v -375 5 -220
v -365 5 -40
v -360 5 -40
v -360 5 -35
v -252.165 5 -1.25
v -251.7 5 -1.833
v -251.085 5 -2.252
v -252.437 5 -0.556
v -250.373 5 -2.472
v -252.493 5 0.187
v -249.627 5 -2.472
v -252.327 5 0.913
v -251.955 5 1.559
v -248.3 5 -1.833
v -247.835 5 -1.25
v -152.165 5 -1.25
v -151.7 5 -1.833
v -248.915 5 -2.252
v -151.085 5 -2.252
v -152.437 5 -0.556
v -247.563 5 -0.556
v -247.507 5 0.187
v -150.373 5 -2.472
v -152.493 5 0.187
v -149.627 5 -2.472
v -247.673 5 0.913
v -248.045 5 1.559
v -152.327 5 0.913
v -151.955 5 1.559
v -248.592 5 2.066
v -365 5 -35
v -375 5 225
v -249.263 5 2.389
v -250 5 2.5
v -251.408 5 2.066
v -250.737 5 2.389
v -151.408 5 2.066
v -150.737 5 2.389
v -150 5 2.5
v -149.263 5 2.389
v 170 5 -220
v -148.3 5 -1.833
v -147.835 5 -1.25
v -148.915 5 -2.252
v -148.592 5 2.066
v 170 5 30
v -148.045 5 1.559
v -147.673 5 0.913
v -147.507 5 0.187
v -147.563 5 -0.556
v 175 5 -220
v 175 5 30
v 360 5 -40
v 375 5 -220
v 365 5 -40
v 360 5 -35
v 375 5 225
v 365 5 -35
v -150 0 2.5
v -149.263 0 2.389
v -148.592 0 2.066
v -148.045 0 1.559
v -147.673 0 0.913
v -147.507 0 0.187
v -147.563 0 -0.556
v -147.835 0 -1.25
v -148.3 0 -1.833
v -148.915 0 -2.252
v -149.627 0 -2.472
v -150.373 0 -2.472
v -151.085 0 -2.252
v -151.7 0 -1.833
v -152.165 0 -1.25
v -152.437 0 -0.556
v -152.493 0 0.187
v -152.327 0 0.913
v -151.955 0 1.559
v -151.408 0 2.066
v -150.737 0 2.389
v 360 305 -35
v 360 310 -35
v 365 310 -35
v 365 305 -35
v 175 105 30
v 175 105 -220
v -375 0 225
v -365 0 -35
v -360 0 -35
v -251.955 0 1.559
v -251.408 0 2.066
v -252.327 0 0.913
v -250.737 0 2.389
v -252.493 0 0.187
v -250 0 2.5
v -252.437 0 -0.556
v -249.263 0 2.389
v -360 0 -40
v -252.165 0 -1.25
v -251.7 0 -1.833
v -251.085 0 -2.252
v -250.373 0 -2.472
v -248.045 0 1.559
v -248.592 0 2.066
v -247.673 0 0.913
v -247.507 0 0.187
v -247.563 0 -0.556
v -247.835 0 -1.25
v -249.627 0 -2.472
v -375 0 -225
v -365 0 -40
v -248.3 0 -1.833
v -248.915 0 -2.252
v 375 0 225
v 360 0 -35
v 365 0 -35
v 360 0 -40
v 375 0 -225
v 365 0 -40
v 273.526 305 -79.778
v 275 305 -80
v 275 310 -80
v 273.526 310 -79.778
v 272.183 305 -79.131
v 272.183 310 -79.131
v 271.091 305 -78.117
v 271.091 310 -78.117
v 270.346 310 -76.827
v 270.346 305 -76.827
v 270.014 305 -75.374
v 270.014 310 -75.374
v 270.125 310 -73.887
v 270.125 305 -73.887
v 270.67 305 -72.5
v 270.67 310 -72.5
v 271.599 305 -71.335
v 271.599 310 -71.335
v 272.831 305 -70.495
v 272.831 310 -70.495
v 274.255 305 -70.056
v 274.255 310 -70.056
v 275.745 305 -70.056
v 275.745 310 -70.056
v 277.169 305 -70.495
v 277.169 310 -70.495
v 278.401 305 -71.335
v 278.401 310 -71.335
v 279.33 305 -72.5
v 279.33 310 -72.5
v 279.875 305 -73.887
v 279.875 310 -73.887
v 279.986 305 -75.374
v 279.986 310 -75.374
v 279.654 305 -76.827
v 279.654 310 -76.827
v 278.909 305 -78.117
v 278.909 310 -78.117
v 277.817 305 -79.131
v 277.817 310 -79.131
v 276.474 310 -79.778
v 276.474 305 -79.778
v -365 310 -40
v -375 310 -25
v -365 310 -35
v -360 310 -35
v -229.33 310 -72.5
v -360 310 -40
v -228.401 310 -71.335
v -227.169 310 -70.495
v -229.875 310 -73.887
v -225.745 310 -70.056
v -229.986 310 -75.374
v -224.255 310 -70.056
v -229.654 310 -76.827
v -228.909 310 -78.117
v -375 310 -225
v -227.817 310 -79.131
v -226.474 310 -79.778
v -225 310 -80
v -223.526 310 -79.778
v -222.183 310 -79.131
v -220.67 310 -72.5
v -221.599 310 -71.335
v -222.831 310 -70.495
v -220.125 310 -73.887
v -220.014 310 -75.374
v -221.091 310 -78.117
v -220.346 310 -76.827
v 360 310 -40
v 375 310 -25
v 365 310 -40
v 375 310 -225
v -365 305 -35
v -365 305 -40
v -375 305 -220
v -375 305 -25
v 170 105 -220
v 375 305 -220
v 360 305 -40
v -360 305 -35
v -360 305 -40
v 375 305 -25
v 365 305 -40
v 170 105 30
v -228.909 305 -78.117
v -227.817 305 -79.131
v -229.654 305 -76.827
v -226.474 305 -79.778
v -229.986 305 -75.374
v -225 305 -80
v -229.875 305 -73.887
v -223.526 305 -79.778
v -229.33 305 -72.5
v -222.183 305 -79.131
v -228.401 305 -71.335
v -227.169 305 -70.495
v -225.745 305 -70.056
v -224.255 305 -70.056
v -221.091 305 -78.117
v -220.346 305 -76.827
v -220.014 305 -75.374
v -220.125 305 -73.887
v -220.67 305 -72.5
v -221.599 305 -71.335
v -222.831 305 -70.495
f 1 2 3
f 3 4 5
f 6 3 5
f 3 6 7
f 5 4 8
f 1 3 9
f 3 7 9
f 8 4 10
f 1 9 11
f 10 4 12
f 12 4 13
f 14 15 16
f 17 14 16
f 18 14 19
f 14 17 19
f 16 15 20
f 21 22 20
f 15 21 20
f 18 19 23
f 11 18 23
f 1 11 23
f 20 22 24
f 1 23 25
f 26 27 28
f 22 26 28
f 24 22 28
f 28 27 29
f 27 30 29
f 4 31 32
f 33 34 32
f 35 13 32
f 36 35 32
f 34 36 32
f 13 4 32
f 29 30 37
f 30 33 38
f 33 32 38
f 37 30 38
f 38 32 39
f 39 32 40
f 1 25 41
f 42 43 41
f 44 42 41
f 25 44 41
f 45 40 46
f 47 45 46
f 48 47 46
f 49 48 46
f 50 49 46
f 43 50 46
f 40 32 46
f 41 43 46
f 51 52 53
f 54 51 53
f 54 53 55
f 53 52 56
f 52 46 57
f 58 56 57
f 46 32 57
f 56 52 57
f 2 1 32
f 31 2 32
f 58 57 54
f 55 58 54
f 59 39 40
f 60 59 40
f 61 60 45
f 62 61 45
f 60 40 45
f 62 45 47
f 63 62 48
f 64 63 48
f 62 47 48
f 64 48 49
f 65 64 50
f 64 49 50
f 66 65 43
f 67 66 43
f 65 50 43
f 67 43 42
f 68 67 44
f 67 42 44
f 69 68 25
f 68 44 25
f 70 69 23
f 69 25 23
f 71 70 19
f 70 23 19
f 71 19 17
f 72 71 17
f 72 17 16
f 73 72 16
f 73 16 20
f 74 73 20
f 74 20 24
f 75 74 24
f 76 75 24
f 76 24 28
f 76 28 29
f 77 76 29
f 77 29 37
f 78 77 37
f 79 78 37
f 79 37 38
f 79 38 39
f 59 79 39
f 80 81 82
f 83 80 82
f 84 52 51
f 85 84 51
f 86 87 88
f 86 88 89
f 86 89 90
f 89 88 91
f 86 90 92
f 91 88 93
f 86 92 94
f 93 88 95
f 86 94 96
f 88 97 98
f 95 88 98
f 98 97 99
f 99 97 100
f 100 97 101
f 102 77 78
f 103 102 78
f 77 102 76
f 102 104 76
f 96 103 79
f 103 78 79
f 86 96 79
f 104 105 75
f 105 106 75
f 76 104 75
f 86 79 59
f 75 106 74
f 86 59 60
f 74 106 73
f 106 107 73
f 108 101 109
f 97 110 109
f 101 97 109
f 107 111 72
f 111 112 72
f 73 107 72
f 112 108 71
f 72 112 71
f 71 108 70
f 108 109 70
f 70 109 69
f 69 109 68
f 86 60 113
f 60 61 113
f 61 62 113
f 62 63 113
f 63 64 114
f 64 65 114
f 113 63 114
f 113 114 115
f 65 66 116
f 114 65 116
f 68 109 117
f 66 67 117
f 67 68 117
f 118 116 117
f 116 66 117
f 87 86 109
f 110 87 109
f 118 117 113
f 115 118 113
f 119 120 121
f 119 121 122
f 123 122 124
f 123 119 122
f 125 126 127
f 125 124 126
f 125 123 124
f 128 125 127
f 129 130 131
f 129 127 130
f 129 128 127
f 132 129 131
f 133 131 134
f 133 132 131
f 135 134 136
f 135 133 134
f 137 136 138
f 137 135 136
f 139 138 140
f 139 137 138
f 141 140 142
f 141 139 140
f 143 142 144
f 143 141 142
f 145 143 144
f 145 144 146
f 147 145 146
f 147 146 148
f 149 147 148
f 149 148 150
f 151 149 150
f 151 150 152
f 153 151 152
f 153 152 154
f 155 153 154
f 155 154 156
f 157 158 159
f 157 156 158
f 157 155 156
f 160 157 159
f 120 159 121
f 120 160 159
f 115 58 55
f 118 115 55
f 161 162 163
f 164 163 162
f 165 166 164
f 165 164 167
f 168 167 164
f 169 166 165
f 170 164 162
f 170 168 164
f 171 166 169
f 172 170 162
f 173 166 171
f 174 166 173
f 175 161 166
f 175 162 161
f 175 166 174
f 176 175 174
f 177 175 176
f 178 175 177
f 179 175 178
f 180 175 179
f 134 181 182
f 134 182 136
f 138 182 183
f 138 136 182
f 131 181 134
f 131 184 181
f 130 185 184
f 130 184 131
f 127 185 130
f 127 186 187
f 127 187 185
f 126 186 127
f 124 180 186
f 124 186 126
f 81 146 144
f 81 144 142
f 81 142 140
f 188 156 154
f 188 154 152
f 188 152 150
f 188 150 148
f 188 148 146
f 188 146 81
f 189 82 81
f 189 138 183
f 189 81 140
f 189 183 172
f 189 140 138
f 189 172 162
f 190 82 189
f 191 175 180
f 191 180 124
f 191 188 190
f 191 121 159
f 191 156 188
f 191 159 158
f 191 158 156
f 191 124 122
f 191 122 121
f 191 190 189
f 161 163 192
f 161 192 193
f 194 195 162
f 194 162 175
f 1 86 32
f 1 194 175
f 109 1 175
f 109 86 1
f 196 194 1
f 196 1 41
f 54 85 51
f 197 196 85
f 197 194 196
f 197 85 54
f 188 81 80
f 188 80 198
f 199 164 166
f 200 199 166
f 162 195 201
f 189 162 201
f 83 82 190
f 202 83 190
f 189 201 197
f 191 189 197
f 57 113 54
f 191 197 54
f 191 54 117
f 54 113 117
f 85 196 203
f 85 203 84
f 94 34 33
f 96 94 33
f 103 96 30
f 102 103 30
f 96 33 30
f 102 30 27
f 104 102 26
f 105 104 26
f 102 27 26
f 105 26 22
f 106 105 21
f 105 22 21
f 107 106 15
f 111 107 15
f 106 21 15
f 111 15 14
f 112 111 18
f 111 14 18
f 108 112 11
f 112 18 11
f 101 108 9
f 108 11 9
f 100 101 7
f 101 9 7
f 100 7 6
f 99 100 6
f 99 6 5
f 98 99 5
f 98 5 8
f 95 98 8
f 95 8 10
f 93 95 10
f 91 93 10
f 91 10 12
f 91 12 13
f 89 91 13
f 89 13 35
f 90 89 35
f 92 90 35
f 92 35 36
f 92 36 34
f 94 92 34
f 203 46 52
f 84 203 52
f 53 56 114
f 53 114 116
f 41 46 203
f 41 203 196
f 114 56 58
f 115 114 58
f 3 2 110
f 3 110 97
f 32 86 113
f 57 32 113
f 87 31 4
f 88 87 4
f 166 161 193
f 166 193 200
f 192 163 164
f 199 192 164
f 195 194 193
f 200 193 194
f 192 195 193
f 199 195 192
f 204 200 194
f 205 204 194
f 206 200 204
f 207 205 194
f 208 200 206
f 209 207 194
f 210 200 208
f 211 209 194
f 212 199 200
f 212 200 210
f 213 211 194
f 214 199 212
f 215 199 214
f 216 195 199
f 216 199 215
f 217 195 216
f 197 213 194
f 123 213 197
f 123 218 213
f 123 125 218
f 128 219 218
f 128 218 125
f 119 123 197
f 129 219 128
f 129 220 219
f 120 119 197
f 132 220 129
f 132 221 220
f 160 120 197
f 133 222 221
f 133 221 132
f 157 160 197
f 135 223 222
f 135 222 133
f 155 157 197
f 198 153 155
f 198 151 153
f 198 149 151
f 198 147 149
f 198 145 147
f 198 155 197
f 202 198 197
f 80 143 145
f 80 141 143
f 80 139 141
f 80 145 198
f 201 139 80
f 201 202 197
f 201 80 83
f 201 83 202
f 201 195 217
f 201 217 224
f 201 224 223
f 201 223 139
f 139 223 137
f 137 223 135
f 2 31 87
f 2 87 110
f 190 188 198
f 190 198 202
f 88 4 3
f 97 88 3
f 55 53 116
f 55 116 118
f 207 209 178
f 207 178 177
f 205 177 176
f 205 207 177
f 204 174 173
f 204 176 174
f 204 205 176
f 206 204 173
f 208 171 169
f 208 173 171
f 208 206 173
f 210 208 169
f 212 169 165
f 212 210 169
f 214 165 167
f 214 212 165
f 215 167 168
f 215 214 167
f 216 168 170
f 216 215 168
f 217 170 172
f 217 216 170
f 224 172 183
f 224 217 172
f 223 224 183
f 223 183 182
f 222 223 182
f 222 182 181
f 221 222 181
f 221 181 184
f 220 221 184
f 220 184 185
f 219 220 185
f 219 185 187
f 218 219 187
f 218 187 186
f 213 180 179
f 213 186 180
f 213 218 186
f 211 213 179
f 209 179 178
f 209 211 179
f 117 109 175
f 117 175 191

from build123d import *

# Parameters (mm, degrees)
SKETCH1_W               = 750
SKETCH1_H               = 450
BOSS_EXTRUDE1_DEPTH     = 310
SKETCH8_W               = 750
SKETCH8_H               = 300
CUT_EXTRUDE1_DEPTH      = 445
SKETCH15_W              = 5
SKETCH15_H              = 250
BOSS_EXTRUDE8_DEPTH     = 100
CUT_EXTRUDE2_DEPTH      = 537.050370768
CUT_EXTRUDE2_DEPTH_BACK = 10
SKETCH16_R              = 5
SKETCH16_W              = 750
SKETCH16_H              = 250
SKETCH18_W              = 5
SKETCH18_H              = 5
CUT_EXTRUDE3_DEPTH      = 537.050370768
SKETCH10_R              = 2.5
CUT_EXTRUDE4_DEPTH      = 534.174455502


with BuildPart() as part:
    # Sketch1 → Boss-Extrude1 (new body)
    with BuildSketch(Plane(origin=(0, 0, 0), x_dir=(1, 0, 0), z_dir=(0, 1, 0))):
        Rectangle(SKETCH1_W, SKETCH1_H)
    extrude(amount=BOSS_EXTRUDE1_DEPTH)

    # Sketch8 → Cut-Extrude1 (cut)
    with BuildSketch(Plane.XY.offset(225)):
        with Locations((0, 155)):
            Rectangle(SKETCH8_W, SKETCH8_H)
    extrude(amount=-CUT_EXTRUDE1_DEPTH, mode=Mode.SUBTRACT)

    # Sketch15 → Boss-Extrude8 (add)
    with BuildSketch(Plane(origin=(0, 5, 0), x_dir=(1, 0, 0), z_dir=(0, 1, 0))):
        with Locations((172.5, 95)):
            Rectangle(SKETCH15_W, SKETCH15_H)
    extrude(amount=BOSS_EXTRUDE8_DEPTH)

    # Sketch16 → Cut-Extrude2 (cut, two sides: drawn at the far end of the back side and taken through both)
    with BuildSketch(Plane(origin=(0, 310, 0), x_dir=(1, 0, 0), z_dir=(0, 1, 0)).offset(-CUT_EXTRUDE2_DEPTH_BACK)):
        with Locations(Location((275, 75, 0), (0, 0, 90))):
            Circle(SKETCH16_R)
        with Locations(Location((-225, 75, 0), (0, 0, 90))):
            Circle(SKETCH16_R)
        with Locations((0, -100)):
            Rectangle(SKETCH16_W, SKETCH16_H)
    extrude(amount=CUT_EXTRUDE2_DEPTH + CUT_EXTRUDE2_DEPTH_BACK, mode=Mode.SUBTRACT)

    # Sketch18 → Cut-Extrude3 (cut, through all)
    with BuildSketch(Plane(origin=(0, 310, 0), x_dir=(1, 0, 0), z_dir=(0, 1, 0))):
        with Locations((-362.5, 37.5)):
            Rectangle(SKETCH18_W, SKETCH18_H)
        with Locations((362.5, 37.5)):
            Rectangle(SKETCH18_W, SKETCH18_H)
    extrude(amount=-CUT_EXTRUDE3_DEPTH, mode=Mode.SUBTRACT)

    # Sketch10 → Cut-Extrude4 (cut, through all)
    with BuildSketch(Plane(origin=(0, 5, 0), x_dir=(1, 0, 0), z_dir=(0, 1, 0))):
        with Locations(Location((-250, 0, 0), (0, 0, 270))):
            Circle(SKETCH10_R)
        with Locations(Location((-150, 0, 0), (0, 0, 270))):
            Circle(SKETCH10_R)
    extrude(amount=-CUT_EXTRUDE4_DEPTH, mode=Mode.SUBTRACT)


solid = part.part
